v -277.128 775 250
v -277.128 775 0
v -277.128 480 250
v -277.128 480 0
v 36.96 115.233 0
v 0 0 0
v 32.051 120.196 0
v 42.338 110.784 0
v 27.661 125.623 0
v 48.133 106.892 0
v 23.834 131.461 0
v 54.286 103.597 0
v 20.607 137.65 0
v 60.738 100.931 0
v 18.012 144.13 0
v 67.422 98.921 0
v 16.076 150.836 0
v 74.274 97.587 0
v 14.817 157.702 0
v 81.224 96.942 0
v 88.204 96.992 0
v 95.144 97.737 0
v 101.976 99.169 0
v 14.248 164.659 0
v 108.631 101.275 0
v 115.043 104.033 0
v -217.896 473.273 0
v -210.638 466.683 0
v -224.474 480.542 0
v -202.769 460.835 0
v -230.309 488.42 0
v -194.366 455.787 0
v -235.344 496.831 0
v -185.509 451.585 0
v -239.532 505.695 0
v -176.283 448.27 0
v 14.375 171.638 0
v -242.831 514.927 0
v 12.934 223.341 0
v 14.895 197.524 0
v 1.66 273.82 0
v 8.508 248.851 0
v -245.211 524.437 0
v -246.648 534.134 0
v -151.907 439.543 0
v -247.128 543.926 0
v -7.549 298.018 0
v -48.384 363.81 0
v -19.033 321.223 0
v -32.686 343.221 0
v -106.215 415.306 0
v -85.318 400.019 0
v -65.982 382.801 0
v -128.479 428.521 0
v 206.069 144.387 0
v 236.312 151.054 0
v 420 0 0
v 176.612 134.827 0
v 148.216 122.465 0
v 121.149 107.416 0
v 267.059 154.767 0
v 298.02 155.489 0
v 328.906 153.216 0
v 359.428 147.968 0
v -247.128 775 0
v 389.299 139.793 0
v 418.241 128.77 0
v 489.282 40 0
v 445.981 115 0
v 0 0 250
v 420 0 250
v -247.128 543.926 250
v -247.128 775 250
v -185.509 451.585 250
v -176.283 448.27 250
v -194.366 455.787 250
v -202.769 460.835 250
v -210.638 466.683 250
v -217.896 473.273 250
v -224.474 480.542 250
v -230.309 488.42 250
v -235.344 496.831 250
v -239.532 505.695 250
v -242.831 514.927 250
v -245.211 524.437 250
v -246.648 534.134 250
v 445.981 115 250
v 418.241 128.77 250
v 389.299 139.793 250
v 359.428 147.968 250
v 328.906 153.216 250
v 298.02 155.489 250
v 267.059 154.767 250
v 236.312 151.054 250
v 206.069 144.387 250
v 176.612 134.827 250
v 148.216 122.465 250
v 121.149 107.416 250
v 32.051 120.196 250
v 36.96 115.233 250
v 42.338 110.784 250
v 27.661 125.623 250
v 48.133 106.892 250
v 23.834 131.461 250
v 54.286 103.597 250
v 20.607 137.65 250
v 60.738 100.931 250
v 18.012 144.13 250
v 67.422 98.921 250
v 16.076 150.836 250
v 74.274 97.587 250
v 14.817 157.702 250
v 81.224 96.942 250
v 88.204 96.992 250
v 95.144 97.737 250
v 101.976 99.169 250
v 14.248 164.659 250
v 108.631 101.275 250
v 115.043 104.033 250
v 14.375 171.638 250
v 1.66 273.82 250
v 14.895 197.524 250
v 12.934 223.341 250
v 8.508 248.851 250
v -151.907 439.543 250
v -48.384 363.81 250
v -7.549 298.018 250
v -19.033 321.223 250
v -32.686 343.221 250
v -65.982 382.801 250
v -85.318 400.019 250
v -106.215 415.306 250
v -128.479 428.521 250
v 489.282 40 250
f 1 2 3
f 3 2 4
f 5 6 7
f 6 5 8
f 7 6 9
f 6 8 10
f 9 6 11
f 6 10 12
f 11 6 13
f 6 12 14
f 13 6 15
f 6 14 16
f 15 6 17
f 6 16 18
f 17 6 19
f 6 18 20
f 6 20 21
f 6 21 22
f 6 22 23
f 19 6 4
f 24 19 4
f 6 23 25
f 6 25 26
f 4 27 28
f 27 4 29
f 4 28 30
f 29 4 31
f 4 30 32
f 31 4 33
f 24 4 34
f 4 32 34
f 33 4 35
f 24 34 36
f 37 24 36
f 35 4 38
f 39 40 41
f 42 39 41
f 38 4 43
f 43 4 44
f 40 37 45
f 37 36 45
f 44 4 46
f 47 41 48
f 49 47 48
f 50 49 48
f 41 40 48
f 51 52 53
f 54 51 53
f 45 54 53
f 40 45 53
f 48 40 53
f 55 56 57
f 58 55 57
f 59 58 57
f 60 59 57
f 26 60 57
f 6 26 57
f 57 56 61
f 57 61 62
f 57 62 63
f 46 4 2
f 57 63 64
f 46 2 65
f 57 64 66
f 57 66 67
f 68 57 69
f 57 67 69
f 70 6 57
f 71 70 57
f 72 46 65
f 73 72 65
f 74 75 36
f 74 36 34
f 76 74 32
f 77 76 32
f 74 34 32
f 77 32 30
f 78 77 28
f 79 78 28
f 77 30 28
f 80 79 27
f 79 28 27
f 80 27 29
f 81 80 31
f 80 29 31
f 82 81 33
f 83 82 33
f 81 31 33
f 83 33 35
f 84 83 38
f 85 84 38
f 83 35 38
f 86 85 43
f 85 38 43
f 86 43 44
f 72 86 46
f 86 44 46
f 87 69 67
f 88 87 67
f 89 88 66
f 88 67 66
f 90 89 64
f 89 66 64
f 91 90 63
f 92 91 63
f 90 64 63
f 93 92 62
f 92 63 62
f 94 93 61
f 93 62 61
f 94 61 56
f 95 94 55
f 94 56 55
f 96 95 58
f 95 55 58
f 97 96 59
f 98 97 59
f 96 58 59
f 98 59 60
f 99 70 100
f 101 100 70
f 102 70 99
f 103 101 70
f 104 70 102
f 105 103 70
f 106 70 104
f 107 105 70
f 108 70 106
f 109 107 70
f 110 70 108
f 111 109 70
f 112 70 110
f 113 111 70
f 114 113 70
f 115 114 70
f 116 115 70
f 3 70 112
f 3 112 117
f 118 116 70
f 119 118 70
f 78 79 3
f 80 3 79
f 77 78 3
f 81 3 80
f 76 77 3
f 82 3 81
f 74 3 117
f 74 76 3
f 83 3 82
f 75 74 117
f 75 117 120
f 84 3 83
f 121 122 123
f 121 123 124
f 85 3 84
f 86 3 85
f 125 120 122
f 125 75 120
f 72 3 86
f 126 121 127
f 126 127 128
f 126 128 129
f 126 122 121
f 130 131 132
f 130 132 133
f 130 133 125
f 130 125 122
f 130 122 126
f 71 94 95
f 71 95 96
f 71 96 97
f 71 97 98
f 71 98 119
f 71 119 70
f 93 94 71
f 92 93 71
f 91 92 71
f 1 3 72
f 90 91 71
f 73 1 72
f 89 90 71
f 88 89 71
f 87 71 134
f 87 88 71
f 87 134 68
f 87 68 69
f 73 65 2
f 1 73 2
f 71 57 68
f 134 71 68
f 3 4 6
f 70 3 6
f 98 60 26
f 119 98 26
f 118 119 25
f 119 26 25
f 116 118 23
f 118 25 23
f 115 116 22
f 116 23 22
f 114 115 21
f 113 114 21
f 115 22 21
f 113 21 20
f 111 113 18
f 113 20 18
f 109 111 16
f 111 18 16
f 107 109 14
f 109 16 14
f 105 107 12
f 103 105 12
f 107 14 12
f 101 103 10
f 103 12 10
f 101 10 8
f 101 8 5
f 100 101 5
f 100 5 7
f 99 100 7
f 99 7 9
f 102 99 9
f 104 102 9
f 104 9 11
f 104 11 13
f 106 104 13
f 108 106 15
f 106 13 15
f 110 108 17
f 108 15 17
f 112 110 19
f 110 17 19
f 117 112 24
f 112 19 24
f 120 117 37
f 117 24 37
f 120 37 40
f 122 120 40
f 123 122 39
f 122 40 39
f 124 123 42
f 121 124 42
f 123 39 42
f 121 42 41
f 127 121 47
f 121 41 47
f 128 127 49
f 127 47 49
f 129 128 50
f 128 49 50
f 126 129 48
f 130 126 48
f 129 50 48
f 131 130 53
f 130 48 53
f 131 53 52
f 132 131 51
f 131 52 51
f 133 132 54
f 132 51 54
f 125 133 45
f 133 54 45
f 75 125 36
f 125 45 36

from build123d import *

# Parameters (mm, degrees)
BOSS_EXTRUDE1_DEPTH = 250


with BuildPart() as part:
    # Sketch2 → Boss-Extrude1 (new body)
    with BuildSketch(Plane.XY):
        with BuildLine():
            Line((-277.128129211, 480), (0, 0))
            Line((0, 0), (420, 0))
            Line((420, 0), (489.282032303, 40))
            Line((489.282032303, 40), (445.980762114, 115))
            ThreePointArc((445.980762114, 115), (282.530694349, 155.502719239), (121.149011162, 107.415847331))
            ThreePointArc((121.149011162, 107.415847331), (48.13293846, 106.892445498), (14.374916134, 171.638231083))
            ThreePointArc((14.374916134, 171.638231083), (-32.686291511, 343.220804781), (-176.282688884, 448.270371763))
            ThreePointArc((-176.282688884, 448.270371763), (-227.488119154, 484.4090757), (-247.128129211, 543.926065009))
            Line((-247.128129211, 543.926065009), (-247.128129211, 775))
            Line((-247.128129211, 775), (-277.128129211, 775))
            Line((-277.128129211, 775), (-277.128129211, 480))
        make_face()
    extrude(amount=BOSS_EXTRUDE1_DEPTH)


solid = part.part
